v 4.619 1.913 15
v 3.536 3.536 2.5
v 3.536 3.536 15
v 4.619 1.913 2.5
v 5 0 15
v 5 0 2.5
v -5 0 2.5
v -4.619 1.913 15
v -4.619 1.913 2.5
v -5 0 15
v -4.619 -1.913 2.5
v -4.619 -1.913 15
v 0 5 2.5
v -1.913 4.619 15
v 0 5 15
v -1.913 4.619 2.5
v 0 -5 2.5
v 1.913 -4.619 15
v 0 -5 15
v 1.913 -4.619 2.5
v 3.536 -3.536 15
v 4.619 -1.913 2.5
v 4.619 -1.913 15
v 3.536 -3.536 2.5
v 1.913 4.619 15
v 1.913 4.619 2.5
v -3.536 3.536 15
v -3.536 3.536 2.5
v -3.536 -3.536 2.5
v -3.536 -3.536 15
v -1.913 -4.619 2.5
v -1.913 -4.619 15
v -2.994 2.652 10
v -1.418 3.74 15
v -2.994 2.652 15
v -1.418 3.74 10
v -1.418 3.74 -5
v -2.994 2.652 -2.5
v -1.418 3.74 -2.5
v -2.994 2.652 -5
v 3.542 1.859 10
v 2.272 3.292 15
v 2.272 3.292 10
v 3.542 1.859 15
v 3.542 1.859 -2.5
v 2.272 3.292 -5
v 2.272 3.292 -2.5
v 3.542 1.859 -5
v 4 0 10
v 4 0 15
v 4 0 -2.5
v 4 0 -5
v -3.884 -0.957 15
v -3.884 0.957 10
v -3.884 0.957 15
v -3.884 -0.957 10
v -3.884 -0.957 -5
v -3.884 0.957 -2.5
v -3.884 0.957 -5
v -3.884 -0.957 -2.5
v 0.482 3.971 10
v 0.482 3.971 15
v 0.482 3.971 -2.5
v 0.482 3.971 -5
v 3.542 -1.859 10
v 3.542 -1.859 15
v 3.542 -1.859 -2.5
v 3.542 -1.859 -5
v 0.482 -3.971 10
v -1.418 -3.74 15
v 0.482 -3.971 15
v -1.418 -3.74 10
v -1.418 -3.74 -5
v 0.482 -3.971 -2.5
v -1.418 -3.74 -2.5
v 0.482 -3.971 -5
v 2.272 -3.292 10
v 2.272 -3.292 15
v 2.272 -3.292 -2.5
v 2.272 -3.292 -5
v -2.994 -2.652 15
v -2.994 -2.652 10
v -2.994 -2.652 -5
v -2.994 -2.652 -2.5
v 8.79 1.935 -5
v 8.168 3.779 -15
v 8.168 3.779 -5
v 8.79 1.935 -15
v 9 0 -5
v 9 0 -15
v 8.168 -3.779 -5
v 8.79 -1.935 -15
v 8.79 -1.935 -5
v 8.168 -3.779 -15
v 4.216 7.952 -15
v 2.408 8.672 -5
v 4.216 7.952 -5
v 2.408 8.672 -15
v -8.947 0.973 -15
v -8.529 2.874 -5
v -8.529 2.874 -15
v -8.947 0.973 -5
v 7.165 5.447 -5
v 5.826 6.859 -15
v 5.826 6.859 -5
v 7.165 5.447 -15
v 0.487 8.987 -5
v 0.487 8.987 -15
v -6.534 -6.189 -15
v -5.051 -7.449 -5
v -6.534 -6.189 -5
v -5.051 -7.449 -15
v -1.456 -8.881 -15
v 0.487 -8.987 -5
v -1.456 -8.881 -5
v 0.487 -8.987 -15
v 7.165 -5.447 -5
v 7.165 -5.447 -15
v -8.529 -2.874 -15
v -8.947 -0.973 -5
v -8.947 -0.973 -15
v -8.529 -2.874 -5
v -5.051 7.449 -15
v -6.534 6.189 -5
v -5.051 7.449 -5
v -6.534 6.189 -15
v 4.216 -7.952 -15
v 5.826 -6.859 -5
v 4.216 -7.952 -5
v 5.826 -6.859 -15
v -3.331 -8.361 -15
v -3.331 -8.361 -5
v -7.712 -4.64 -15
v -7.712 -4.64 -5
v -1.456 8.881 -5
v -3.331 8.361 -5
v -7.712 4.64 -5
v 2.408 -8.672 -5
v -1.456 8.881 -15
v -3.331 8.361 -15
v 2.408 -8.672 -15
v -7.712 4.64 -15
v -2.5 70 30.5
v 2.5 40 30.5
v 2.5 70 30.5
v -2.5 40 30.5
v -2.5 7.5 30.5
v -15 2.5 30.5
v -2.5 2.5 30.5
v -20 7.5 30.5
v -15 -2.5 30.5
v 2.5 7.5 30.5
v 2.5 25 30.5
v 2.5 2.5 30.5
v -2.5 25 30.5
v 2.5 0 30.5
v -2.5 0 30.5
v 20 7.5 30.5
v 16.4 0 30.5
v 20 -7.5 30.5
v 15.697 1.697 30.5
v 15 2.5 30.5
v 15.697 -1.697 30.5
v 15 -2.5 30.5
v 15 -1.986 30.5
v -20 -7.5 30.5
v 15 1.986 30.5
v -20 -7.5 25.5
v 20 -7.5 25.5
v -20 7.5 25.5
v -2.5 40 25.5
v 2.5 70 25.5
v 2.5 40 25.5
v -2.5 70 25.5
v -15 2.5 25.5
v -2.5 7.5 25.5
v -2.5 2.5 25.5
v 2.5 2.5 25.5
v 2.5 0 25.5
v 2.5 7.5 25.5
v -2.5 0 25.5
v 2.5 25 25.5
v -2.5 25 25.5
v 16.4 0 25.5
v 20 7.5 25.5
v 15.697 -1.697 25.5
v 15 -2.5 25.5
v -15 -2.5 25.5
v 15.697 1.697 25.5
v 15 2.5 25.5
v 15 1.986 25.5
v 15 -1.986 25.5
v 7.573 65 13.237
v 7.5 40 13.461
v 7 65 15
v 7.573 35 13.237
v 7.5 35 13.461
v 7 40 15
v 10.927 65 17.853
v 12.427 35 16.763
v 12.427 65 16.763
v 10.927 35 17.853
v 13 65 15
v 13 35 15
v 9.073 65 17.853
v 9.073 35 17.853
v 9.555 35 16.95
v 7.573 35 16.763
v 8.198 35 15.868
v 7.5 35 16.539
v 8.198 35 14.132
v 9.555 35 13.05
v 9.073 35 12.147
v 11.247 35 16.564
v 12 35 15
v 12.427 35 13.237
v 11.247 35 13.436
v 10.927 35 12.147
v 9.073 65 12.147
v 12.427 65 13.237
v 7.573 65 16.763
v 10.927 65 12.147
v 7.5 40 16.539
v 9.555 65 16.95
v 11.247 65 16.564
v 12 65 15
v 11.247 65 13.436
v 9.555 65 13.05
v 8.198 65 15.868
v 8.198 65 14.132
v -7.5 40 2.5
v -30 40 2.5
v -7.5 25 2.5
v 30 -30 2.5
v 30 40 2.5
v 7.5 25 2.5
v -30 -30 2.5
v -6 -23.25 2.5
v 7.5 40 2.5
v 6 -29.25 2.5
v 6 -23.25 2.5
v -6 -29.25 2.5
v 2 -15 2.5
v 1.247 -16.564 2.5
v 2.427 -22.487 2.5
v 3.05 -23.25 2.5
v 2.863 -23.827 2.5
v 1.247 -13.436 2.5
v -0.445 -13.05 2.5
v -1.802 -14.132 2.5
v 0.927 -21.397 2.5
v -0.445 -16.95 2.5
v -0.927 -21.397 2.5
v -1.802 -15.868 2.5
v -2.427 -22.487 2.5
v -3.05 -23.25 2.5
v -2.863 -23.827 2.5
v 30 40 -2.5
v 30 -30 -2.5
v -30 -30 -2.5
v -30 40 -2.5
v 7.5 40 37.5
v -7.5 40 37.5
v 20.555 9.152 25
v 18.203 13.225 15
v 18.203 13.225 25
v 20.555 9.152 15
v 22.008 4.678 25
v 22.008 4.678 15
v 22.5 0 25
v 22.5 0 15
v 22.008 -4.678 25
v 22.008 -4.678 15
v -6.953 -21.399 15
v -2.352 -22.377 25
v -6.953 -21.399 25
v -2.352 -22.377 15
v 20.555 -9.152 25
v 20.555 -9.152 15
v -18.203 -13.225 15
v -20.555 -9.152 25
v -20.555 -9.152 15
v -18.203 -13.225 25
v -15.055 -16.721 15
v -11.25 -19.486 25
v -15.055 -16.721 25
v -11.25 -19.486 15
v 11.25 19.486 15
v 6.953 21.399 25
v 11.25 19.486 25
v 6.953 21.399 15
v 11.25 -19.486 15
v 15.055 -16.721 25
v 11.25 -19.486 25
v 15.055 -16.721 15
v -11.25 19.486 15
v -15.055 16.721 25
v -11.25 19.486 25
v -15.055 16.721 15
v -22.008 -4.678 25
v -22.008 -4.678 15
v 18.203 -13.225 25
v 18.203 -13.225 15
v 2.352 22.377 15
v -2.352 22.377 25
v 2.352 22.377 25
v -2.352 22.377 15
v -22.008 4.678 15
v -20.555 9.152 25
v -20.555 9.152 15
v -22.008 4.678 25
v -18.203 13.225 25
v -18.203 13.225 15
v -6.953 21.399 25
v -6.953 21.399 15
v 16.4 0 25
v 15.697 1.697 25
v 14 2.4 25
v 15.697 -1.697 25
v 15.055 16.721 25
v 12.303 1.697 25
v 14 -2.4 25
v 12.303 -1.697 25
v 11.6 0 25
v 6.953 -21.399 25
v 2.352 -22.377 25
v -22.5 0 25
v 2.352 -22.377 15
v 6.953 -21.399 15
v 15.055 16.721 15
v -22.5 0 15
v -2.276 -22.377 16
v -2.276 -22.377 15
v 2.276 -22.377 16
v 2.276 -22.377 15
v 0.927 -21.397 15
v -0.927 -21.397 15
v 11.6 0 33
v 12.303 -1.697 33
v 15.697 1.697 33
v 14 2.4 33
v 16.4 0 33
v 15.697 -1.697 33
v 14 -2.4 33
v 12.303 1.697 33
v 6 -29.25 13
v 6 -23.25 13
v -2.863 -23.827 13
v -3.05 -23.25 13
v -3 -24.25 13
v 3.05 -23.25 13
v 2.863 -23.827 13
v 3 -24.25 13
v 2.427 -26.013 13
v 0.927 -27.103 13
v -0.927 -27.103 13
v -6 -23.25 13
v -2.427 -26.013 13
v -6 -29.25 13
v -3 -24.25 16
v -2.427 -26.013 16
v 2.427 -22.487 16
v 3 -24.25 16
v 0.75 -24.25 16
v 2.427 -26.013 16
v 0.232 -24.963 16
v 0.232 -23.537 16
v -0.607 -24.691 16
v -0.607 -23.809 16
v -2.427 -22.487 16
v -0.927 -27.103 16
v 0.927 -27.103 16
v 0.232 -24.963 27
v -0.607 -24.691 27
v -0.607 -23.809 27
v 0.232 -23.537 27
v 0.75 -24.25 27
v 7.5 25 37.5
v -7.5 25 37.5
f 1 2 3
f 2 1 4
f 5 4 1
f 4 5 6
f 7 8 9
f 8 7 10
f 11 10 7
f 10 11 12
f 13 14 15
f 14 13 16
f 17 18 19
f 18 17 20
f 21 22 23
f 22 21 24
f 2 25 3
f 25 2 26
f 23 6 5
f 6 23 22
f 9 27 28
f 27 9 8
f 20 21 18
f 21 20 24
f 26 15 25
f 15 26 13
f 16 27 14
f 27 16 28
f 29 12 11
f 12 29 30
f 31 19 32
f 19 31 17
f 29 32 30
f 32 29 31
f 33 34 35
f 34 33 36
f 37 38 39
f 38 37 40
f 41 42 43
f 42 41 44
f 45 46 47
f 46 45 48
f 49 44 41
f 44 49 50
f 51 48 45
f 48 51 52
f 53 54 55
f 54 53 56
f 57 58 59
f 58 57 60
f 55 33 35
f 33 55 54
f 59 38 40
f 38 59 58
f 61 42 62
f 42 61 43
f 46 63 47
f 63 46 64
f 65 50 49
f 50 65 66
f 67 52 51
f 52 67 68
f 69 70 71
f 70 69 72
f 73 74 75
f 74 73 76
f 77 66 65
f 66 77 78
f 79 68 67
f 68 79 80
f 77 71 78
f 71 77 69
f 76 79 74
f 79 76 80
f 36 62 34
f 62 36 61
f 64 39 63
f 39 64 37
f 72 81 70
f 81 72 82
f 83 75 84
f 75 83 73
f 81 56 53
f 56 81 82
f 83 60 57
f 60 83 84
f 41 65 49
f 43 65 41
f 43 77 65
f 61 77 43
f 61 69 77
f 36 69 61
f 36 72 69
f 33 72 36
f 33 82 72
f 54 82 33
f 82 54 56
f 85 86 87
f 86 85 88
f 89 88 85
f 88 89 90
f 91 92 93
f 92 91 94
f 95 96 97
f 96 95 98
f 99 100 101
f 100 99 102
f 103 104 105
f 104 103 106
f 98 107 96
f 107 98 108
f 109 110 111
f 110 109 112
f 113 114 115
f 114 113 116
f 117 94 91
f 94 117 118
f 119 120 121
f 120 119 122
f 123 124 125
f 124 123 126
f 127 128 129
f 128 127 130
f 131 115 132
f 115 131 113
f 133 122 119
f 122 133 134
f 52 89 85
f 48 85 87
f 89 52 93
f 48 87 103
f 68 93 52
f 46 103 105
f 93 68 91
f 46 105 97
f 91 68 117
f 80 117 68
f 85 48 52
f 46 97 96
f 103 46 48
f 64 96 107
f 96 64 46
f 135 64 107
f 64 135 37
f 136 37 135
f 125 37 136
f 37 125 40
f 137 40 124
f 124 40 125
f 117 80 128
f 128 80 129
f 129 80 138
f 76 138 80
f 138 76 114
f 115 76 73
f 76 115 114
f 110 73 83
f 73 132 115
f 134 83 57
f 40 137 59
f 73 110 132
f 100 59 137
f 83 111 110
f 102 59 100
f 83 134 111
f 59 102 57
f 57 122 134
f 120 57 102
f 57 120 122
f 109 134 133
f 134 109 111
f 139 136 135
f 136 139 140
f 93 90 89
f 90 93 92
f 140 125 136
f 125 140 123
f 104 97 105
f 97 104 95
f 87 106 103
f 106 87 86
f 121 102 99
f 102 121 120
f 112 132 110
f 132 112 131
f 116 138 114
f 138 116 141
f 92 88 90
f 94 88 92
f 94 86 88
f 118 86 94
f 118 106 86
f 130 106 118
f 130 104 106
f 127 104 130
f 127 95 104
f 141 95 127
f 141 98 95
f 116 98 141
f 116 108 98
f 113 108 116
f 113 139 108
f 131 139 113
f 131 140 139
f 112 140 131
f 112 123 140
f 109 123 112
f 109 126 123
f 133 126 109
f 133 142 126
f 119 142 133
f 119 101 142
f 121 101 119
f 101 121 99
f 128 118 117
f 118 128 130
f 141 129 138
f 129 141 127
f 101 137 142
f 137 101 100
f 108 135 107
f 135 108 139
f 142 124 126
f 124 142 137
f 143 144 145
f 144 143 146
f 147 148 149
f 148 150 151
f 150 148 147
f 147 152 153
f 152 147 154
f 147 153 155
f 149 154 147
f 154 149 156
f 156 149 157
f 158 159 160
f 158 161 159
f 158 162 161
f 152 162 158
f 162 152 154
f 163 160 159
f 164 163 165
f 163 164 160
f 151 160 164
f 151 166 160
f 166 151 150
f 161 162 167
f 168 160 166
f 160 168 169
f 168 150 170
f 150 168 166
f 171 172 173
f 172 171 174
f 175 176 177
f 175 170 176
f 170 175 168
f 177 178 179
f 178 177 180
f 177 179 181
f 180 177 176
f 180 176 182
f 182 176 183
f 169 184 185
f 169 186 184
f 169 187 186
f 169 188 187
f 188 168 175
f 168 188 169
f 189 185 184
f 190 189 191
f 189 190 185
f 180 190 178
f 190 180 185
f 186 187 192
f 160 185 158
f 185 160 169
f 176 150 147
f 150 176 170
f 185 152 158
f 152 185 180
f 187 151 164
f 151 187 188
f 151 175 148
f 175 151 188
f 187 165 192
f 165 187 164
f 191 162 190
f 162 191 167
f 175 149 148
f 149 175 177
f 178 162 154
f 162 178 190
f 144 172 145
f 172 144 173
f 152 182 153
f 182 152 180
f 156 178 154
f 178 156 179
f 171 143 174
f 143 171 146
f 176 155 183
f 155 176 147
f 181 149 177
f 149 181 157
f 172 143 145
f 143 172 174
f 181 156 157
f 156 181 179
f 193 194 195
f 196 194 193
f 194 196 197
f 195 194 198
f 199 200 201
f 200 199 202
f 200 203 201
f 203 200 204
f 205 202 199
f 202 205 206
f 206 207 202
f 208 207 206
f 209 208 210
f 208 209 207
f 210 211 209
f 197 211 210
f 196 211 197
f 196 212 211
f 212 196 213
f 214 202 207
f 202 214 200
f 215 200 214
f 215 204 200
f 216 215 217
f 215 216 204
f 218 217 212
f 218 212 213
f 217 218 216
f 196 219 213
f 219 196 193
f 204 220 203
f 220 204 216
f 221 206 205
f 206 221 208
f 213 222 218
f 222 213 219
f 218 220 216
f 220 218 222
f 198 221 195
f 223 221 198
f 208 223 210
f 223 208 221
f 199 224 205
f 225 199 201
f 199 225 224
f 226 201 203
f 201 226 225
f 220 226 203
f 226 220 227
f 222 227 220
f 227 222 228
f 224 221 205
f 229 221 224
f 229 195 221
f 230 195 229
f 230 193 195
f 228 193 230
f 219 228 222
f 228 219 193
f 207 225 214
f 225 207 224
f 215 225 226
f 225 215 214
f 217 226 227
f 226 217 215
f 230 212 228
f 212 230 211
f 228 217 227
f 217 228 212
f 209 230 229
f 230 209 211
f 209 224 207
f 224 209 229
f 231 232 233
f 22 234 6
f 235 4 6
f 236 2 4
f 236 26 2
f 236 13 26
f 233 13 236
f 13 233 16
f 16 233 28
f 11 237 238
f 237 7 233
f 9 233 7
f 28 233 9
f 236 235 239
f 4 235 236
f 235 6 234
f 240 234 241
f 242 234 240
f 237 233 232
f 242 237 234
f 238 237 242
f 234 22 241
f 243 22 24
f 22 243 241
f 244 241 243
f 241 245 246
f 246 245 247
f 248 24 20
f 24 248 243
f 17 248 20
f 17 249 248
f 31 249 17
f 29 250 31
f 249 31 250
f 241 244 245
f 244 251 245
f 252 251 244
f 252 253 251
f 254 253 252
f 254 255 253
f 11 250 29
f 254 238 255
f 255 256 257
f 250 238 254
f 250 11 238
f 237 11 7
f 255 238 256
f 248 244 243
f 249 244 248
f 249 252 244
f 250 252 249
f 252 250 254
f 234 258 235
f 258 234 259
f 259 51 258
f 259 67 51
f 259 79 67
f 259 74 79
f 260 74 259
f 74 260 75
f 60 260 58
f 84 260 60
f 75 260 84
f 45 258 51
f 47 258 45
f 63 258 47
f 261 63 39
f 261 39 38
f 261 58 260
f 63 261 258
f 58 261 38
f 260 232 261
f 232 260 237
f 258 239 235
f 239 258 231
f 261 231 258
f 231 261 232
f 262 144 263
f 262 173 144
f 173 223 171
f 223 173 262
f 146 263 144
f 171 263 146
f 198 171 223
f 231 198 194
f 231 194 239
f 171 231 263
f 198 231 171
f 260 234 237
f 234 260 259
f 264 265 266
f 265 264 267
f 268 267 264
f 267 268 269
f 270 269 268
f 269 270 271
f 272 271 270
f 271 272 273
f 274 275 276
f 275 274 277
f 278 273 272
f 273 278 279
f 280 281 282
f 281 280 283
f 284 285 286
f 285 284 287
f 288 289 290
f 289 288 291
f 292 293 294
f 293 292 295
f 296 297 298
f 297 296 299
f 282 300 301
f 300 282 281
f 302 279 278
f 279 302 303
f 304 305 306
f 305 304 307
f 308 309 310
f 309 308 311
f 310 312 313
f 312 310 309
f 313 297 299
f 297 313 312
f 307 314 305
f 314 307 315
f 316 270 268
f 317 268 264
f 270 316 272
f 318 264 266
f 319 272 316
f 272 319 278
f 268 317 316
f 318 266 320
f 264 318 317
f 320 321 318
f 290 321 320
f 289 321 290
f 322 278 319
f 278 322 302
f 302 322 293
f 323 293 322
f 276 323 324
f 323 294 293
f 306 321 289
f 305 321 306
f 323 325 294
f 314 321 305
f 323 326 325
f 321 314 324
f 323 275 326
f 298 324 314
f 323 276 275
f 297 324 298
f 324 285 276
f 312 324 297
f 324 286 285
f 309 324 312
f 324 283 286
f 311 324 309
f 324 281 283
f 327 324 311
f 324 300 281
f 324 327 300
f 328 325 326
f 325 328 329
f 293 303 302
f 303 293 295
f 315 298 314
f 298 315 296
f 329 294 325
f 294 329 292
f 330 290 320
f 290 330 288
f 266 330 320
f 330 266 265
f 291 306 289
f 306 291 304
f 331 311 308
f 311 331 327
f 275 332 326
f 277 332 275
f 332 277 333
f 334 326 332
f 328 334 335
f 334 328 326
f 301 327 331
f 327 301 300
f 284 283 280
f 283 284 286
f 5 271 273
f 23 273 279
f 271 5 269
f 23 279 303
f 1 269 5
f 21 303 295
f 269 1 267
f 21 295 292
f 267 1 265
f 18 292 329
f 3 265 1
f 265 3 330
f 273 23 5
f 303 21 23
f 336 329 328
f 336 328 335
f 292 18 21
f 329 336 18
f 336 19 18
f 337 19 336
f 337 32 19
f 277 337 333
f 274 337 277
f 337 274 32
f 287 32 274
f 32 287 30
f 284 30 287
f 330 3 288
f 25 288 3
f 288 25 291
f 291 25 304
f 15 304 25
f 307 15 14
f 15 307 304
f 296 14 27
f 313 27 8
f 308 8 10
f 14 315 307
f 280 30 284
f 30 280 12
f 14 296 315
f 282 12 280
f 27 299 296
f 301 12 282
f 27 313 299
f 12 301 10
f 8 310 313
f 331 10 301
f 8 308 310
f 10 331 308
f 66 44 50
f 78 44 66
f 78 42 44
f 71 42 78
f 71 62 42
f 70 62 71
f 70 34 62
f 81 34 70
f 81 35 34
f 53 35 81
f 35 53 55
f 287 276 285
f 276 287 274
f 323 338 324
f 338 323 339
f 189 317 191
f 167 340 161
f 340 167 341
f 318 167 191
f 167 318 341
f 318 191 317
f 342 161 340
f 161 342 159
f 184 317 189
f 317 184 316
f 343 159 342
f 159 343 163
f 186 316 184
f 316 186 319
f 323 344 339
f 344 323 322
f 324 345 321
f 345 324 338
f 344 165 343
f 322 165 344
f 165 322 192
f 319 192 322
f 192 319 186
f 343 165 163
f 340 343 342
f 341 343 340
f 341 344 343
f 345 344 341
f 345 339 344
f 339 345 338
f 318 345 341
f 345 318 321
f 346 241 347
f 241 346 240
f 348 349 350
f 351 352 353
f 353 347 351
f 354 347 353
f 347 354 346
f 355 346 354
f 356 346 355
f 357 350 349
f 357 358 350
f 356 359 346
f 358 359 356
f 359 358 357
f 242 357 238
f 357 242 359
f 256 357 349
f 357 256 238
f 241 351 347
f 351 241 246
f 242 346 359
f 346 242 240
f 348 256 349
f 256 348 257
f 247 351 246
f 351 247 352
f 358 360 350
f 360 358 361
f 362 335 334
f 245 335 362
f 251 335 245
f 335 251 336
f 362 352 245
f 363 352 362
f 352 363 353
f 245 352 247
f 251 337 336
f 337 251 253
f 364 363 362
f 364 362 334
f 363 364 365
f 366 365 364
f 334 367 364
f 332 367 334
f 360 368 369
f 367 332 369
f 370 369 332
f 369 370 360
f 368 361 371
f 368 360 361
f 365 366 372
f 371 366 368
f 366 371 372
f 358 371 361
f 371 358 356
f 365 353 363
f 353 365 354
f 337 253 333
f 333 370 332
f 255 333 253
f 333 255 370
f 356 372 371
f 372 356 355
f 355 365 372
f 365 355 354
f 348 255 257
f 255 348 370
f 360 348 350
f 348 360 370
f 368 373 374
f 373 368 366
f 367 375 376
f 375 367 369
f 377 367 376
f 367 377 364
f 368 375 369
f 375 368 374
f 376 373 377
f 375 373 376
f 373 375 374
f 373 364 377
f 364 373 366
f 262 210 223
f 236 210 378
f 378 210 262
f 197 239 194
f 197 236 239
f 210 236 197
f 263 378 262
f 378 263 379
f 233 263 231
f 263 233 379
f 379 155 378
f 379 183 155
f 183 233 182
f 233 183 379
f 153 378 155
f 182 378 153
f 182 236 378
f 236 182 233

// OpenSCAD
//linear actuator

//use <motor mount.scad>;
trackwheelDiameter=45;
trackwheelHeight=10;
gearwheeelDiameter=50;
gearwheelHeight=5;
caseHeight=60;
caseDepth=70;
caseThickness=5;
baseThickness=5;
caseWidth=60;
motorHeight=15;
motorDiameter=20;
motorLength=13;
motorSpindleLength=20;
barLength=70;
barWidth=5;
barHeight=5;
yokeLength=40;
yokeWidth=15;
yokeSlotLength=30;
yokeSlotWidth=5;
pinOffset=yokeSlotLength/2-1;
pinHeight=8;
motorLength=14;
motorDiameter=6;
spindleDiameter=1.5;
spindleLength=6;
LEDProbeLength=30;
LEDProbeDiameter=6;





module base() {
    difference() {
        cube([caseWidth,caseDepth,baseThickness],center=true);
        translate([0,-20,baseThickness/2]) union() {
            cylinder(h=baseThickness/2+1, d=4);
            cylinder(h=baseThickness+1, d=2);  
        }
    }
}


module back() {
        cube([caseWidth,baseThickness,caseDepth],center=true);
    }


module case() {
    union() {
       translate([0,5,0]) base();
   //translate([0,-caseDepth/2,caseHeight/2]) back();    
    }
}

module sleeve() {
    color("silver") difference() {
        cylinder(h=20,d=10,center=true);
        cylinder(h=20,d=8,center=true);
}
}

translate([0,0,10]) sleeve();

module axle() {
    color("black") cylinder(h=20,d=8,center=true);
    color("black")  translate([0,0,-10]) cylinder(h=10,d=18,center=true);
}

translate([0,0,0]) axle();



module trackwheel() {
    union() {
        cylinder(d=trackwheelDiameter,h=trackwheelHeight,center=true);
        translate([pinOffset,0,trackwheelHeight/2]) cylinder(h=pinHeight,d=yokeSlotWidth-0.2);
    }
}

module bar() {
    color("blue") cube([barWidth,barLength,barHeight],center=true);
}

module scotchYoke() {
    color("blue") translate([0,barLength/2,0]) cube([barWidth,barLength,barHeight],center=true);
    difference() {
    color("blue") rotate([0,0,90]) cube([yokeWidth,yokeLength,barHeight],center=true);
    rotate([0,0,90]) cube([yokeSlotWidth,yokeSlotLength,barHeight],center=true);
    }
}

translate([0,0,18+trackwheelHeight]) scotchYoke();

module sliderMount() {
    translate([-barWidth*3/2,25,caseThickness/2]) cube([barWidth*3,15,35]);
}

sliderMount();

module motorMount() {
    difference() {
        cube([motorDiameter*2,motorDiameter,motorLength],center=true);
        translate([0,motorDiameter/2-0,0]) cylinder(h=motorLength+0.1, d=motorDiameter+0.1,center=true);
    }
}

module motor() {
    color("silver") union() {
    cylinder(h=14,d=6);
    cylinder(h=25,d=1.5);
    }
}

module LEDProbe() {
    difference() {
        cylinder(h=LEDProbeLength,d=LEDProbeDiameter,center=true);
        cylinder(h=LEDProbeLength,d=LEDProbeDiameter-2,center=true);
    }
}

translate([barWidth*2,50,15]) rotate([90,0,0]) LEDProbe();


module linearactuator() {
  //  bar();
    case();
    color("green") translate([0,0,20]) trackwheel();
 translate([0,-trackwheelDiameter/2-motorDiameter/2-spindleDiameter/2,6])  motorMount();
    translate([0,-trackwheelDiameter/2-motorDiameter/2-spindleDiameter/2+2,2]) motor();

}

linearactuator();
